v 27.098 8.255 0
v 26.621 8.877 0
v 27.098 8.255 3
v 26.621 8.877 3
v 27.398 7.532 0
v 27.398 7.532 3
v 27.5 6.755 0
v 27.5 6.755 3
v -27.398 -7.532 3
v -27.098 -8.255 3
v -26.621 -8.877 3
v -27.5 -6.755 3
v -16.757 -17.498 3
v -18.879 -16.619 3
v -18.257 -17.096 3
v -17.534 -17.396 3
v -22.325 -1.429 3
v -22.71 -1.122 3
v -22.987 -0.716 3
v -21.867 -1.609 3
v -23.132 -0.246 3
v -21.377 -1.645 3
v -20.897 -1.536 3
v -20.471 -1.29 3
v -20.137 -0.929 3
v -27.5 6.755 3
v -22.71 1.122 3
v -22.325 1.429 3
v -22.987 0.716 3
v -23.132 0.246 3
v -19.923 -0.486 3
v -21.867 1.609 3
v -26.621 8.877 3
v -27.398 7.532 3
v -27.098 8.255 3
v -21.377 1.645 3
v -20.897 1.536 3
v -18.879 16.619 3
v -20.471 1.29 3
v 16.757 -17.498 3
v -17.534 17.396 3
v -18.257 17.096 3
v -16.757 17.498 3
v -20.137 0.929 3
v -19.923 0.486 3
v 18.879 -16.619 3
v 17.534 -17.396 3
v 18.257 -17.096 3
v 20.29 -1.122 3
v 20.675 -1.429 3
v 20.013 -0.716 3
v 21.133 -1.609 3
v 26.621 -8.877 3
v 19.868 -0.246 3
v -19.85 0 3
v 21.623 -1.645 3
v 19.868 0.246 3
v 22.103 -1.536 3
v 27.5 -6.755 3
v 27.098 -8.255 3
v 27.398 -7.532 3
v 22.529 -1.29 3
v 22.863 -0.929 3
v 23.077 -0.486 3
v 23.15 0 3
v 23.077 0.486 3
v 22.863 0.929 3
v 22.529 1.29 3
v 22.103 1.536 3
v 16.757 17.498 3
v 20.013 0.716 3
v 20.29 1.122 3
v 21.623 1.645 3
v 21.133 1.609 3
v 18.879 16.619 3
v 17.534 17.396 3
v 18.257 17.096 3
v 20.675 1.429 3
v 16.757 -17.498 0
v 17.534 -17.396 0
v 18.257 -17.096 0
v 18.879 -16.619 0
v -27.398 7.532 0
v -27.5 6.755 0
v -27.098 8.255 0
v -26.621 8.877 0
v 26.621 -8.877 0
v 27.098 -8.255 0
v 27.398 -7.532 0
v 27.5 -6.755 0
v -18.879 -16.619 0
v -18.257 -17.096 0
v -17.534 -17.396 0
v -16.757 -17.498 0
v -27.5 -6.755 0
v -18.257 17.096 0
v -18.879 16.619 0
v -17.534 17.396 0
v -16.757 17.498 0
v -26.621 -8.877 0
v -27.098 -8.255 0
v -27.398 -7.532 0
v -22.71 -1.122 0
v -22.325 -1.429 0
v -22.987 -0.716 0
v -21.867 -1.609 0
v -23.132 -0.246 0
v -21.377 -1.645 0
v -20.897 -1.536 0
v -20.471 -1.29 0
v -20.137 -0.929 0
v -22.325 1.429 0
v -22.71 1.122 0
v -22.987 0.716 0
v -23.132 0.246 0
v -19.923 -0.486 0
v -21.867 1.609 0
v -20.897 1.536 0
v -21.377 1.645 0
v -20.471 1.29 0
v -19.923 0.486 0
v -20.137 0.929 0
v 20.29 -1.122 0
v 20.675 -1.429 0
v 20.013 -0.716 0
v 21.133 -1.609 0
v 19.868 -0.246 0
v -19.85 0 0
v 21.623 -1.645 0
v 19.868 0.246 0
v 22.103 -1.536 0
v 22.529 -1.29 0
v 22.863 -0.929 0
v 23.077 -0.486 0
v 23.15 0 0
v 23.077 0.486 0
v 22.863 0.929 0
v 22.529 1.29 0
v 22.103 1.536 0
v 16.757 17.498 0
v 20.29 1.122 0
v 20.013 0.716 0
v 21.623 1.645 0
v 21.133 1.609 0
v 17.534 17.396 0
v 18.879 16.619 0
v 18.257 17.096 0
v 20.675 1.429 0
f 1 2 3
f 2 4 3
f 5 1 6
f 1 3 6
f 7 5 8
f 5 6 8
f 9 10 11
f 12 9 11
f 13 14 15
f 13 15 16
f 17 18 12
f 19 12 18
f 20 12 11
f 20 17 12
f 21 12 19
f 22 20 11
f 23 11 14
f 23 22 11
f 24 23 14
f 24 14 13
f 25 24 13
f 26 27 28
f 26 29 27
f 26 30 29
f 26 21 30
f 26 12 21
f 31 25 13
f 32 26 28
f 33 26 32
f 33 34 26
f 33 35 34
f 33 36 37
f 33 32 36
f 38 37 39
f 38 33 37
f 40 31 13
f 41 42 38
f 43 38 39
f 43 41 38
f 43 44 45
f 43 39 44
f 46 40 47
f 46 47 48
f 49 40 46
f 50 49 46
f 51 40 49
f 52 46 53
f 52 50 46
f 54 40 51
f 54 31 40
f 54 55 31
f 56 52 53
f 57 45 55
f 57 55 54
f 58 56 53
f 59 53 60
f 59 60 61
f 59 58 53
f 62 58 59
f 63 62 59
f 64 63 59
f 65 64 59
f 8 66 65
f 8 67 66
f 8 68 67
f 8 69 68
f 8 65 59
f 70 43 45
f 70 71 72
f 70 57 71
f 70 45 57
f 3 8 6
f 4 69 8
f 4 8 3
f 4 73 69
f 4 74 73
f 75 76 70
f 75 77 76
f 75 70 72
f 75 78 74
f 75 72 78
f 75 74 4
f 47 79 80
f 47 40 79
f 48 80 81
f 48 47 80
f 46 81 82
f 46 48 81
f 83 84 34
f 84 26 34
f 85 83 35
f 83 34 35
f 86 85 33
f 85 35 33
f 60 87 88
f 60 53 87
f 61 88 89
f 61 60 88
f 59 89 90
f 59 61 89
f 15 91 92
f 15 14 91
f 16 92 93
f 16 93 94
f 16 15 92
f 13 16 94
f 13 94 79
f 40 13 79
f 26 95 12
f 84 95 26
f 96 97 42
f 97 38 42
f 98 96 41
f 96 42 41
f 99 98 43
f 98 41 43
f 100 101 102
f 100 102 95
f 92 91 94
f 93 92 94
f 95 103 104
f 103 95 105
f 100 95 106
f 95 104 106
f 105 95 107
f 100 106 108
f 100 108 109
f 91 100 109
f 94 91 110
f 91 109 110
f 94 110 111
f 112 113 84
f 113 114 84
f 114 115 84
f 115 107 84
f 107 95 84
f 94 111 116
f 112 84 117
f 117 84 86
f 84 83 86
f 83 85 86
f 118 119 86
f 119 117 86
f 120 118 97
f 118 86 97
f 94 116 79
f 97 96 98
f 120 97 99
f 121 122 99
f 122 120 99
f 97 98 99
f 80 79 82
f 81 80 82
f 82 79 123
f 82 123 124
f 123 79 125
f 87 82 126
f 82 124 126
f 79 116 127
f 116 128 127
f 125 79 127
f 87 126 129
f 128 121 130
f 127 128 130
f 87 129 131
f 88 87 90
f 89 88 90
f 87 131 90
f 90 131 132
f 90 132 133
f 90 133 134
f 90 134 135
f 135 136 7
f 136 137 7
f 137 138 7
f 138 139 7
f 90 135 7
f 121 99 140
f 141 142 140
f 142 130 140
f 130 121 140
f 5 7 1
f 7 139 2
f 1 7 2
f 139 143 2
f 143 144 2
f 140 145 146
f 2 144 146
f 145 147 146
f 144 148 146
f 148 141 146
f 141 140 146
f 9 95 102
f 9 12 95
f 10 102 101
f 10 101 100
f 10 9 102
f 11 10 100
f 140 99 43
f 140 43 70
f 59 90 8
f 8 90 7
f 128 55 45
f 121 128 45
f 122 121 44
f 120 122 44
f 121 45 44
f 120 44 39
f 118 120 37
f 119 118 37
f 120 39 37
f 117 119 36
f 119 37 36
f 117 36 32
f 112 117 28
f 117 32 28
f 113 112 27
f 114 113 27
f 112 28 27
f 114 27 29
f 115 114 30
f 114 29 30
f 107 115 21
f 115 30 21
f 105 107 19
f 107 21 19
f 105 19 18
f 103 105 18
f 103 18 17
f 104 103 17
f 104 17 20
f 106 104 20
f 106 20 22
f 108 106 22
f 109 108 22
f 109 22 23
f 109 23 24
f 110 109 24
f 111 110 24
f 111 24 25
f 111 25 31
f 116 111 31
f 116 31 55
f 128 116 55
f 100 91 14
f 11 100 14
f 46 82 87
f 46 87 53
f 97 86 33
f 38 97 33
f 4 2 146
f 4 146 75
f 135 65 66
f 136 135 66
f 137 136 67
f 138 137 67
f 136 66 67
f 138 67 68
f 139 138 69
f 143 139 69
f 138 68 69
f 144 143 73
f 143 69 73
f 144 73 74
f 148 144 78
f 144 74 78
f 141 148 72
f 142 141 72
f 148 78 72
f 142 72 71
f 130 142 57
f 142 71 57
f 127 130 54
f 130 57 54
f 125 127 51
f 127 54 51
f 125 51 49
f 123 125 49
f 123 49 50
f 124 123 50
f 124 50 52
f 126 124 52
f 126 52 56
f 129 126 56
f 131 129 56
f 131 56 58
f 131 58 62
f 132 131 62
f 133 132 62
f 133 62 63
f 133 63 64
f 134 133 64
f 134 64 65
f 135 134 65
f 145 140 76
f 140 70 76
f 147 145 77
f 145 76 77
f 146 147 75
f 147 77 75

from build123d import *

# Parameters (mm, degrees)
SKETCH_1_W          = 55
SKETCH_1_H          = 34.996183206
EXTRUDE_1_DEPTH     = 3
CHAMFER_1_SIZE      = 9.5
FILLET_1_R          = 3
SKETCH_2_R          = 1.65
CUT_EXTRUDE_1_DEPTH = 4


with BuildPart() as part:
    # 草图1 → 凸台-拉伸1 (new body)
    with BuildSketch(Plane.XY):
        Rectangle(SKETCH_1_W, SKETCH_1_H)
    extrude(amount=EXTRUDE_1_DEPTH)

    # 倒角1
    chamfer_1_edges = [part.edges().sort_by_distance(p)[0] for p in [
        (27.5, -17.498091603, 1.5),
        (-27.5, -17.498091603, 1.5),
        (-27.5, 17.498091603, 1.5),
        (27.5, 17.498091603, 1.5),
    ]]
    chamfer(chamfer_1_edges, length=CHAMFER_1_SIZE)

    # 圆角1
    fillet_1_edges = [part.edges().sort_by_distance(p)[0] for p in [
        (-27.5, -7.998091603, 1.5),
        (-27.5, 7.998091603, 1.5),
        (18, 17.498091603, 1.5),
        (-18, 17.498091603, 1.5),
        (18, -17.498091603, 1.5),
        (-18, -17.498091603, 1.5),
        (27.5, 7.998091603, 1.5),
        (27.5, -7.998091603, 1.5),
    ]]
    fillet(fillet_1_edges, radius=FILLET_1_R)

    # 草图2 → 切除-拉伸1 (cut, through all)
    with BuildSketch(Plane.XY.offset(3)):
        with Locations((-21.5, 0)):
            Circle(SKETCH_2_R)
        with Locations((21.5, 0)):
            Circle(SKETCH_2_R)
    extrude(amount=-CUT_EXTRUDE_1_DEPTH, mode=Mode.SUBTRACT)


solid = part.part
